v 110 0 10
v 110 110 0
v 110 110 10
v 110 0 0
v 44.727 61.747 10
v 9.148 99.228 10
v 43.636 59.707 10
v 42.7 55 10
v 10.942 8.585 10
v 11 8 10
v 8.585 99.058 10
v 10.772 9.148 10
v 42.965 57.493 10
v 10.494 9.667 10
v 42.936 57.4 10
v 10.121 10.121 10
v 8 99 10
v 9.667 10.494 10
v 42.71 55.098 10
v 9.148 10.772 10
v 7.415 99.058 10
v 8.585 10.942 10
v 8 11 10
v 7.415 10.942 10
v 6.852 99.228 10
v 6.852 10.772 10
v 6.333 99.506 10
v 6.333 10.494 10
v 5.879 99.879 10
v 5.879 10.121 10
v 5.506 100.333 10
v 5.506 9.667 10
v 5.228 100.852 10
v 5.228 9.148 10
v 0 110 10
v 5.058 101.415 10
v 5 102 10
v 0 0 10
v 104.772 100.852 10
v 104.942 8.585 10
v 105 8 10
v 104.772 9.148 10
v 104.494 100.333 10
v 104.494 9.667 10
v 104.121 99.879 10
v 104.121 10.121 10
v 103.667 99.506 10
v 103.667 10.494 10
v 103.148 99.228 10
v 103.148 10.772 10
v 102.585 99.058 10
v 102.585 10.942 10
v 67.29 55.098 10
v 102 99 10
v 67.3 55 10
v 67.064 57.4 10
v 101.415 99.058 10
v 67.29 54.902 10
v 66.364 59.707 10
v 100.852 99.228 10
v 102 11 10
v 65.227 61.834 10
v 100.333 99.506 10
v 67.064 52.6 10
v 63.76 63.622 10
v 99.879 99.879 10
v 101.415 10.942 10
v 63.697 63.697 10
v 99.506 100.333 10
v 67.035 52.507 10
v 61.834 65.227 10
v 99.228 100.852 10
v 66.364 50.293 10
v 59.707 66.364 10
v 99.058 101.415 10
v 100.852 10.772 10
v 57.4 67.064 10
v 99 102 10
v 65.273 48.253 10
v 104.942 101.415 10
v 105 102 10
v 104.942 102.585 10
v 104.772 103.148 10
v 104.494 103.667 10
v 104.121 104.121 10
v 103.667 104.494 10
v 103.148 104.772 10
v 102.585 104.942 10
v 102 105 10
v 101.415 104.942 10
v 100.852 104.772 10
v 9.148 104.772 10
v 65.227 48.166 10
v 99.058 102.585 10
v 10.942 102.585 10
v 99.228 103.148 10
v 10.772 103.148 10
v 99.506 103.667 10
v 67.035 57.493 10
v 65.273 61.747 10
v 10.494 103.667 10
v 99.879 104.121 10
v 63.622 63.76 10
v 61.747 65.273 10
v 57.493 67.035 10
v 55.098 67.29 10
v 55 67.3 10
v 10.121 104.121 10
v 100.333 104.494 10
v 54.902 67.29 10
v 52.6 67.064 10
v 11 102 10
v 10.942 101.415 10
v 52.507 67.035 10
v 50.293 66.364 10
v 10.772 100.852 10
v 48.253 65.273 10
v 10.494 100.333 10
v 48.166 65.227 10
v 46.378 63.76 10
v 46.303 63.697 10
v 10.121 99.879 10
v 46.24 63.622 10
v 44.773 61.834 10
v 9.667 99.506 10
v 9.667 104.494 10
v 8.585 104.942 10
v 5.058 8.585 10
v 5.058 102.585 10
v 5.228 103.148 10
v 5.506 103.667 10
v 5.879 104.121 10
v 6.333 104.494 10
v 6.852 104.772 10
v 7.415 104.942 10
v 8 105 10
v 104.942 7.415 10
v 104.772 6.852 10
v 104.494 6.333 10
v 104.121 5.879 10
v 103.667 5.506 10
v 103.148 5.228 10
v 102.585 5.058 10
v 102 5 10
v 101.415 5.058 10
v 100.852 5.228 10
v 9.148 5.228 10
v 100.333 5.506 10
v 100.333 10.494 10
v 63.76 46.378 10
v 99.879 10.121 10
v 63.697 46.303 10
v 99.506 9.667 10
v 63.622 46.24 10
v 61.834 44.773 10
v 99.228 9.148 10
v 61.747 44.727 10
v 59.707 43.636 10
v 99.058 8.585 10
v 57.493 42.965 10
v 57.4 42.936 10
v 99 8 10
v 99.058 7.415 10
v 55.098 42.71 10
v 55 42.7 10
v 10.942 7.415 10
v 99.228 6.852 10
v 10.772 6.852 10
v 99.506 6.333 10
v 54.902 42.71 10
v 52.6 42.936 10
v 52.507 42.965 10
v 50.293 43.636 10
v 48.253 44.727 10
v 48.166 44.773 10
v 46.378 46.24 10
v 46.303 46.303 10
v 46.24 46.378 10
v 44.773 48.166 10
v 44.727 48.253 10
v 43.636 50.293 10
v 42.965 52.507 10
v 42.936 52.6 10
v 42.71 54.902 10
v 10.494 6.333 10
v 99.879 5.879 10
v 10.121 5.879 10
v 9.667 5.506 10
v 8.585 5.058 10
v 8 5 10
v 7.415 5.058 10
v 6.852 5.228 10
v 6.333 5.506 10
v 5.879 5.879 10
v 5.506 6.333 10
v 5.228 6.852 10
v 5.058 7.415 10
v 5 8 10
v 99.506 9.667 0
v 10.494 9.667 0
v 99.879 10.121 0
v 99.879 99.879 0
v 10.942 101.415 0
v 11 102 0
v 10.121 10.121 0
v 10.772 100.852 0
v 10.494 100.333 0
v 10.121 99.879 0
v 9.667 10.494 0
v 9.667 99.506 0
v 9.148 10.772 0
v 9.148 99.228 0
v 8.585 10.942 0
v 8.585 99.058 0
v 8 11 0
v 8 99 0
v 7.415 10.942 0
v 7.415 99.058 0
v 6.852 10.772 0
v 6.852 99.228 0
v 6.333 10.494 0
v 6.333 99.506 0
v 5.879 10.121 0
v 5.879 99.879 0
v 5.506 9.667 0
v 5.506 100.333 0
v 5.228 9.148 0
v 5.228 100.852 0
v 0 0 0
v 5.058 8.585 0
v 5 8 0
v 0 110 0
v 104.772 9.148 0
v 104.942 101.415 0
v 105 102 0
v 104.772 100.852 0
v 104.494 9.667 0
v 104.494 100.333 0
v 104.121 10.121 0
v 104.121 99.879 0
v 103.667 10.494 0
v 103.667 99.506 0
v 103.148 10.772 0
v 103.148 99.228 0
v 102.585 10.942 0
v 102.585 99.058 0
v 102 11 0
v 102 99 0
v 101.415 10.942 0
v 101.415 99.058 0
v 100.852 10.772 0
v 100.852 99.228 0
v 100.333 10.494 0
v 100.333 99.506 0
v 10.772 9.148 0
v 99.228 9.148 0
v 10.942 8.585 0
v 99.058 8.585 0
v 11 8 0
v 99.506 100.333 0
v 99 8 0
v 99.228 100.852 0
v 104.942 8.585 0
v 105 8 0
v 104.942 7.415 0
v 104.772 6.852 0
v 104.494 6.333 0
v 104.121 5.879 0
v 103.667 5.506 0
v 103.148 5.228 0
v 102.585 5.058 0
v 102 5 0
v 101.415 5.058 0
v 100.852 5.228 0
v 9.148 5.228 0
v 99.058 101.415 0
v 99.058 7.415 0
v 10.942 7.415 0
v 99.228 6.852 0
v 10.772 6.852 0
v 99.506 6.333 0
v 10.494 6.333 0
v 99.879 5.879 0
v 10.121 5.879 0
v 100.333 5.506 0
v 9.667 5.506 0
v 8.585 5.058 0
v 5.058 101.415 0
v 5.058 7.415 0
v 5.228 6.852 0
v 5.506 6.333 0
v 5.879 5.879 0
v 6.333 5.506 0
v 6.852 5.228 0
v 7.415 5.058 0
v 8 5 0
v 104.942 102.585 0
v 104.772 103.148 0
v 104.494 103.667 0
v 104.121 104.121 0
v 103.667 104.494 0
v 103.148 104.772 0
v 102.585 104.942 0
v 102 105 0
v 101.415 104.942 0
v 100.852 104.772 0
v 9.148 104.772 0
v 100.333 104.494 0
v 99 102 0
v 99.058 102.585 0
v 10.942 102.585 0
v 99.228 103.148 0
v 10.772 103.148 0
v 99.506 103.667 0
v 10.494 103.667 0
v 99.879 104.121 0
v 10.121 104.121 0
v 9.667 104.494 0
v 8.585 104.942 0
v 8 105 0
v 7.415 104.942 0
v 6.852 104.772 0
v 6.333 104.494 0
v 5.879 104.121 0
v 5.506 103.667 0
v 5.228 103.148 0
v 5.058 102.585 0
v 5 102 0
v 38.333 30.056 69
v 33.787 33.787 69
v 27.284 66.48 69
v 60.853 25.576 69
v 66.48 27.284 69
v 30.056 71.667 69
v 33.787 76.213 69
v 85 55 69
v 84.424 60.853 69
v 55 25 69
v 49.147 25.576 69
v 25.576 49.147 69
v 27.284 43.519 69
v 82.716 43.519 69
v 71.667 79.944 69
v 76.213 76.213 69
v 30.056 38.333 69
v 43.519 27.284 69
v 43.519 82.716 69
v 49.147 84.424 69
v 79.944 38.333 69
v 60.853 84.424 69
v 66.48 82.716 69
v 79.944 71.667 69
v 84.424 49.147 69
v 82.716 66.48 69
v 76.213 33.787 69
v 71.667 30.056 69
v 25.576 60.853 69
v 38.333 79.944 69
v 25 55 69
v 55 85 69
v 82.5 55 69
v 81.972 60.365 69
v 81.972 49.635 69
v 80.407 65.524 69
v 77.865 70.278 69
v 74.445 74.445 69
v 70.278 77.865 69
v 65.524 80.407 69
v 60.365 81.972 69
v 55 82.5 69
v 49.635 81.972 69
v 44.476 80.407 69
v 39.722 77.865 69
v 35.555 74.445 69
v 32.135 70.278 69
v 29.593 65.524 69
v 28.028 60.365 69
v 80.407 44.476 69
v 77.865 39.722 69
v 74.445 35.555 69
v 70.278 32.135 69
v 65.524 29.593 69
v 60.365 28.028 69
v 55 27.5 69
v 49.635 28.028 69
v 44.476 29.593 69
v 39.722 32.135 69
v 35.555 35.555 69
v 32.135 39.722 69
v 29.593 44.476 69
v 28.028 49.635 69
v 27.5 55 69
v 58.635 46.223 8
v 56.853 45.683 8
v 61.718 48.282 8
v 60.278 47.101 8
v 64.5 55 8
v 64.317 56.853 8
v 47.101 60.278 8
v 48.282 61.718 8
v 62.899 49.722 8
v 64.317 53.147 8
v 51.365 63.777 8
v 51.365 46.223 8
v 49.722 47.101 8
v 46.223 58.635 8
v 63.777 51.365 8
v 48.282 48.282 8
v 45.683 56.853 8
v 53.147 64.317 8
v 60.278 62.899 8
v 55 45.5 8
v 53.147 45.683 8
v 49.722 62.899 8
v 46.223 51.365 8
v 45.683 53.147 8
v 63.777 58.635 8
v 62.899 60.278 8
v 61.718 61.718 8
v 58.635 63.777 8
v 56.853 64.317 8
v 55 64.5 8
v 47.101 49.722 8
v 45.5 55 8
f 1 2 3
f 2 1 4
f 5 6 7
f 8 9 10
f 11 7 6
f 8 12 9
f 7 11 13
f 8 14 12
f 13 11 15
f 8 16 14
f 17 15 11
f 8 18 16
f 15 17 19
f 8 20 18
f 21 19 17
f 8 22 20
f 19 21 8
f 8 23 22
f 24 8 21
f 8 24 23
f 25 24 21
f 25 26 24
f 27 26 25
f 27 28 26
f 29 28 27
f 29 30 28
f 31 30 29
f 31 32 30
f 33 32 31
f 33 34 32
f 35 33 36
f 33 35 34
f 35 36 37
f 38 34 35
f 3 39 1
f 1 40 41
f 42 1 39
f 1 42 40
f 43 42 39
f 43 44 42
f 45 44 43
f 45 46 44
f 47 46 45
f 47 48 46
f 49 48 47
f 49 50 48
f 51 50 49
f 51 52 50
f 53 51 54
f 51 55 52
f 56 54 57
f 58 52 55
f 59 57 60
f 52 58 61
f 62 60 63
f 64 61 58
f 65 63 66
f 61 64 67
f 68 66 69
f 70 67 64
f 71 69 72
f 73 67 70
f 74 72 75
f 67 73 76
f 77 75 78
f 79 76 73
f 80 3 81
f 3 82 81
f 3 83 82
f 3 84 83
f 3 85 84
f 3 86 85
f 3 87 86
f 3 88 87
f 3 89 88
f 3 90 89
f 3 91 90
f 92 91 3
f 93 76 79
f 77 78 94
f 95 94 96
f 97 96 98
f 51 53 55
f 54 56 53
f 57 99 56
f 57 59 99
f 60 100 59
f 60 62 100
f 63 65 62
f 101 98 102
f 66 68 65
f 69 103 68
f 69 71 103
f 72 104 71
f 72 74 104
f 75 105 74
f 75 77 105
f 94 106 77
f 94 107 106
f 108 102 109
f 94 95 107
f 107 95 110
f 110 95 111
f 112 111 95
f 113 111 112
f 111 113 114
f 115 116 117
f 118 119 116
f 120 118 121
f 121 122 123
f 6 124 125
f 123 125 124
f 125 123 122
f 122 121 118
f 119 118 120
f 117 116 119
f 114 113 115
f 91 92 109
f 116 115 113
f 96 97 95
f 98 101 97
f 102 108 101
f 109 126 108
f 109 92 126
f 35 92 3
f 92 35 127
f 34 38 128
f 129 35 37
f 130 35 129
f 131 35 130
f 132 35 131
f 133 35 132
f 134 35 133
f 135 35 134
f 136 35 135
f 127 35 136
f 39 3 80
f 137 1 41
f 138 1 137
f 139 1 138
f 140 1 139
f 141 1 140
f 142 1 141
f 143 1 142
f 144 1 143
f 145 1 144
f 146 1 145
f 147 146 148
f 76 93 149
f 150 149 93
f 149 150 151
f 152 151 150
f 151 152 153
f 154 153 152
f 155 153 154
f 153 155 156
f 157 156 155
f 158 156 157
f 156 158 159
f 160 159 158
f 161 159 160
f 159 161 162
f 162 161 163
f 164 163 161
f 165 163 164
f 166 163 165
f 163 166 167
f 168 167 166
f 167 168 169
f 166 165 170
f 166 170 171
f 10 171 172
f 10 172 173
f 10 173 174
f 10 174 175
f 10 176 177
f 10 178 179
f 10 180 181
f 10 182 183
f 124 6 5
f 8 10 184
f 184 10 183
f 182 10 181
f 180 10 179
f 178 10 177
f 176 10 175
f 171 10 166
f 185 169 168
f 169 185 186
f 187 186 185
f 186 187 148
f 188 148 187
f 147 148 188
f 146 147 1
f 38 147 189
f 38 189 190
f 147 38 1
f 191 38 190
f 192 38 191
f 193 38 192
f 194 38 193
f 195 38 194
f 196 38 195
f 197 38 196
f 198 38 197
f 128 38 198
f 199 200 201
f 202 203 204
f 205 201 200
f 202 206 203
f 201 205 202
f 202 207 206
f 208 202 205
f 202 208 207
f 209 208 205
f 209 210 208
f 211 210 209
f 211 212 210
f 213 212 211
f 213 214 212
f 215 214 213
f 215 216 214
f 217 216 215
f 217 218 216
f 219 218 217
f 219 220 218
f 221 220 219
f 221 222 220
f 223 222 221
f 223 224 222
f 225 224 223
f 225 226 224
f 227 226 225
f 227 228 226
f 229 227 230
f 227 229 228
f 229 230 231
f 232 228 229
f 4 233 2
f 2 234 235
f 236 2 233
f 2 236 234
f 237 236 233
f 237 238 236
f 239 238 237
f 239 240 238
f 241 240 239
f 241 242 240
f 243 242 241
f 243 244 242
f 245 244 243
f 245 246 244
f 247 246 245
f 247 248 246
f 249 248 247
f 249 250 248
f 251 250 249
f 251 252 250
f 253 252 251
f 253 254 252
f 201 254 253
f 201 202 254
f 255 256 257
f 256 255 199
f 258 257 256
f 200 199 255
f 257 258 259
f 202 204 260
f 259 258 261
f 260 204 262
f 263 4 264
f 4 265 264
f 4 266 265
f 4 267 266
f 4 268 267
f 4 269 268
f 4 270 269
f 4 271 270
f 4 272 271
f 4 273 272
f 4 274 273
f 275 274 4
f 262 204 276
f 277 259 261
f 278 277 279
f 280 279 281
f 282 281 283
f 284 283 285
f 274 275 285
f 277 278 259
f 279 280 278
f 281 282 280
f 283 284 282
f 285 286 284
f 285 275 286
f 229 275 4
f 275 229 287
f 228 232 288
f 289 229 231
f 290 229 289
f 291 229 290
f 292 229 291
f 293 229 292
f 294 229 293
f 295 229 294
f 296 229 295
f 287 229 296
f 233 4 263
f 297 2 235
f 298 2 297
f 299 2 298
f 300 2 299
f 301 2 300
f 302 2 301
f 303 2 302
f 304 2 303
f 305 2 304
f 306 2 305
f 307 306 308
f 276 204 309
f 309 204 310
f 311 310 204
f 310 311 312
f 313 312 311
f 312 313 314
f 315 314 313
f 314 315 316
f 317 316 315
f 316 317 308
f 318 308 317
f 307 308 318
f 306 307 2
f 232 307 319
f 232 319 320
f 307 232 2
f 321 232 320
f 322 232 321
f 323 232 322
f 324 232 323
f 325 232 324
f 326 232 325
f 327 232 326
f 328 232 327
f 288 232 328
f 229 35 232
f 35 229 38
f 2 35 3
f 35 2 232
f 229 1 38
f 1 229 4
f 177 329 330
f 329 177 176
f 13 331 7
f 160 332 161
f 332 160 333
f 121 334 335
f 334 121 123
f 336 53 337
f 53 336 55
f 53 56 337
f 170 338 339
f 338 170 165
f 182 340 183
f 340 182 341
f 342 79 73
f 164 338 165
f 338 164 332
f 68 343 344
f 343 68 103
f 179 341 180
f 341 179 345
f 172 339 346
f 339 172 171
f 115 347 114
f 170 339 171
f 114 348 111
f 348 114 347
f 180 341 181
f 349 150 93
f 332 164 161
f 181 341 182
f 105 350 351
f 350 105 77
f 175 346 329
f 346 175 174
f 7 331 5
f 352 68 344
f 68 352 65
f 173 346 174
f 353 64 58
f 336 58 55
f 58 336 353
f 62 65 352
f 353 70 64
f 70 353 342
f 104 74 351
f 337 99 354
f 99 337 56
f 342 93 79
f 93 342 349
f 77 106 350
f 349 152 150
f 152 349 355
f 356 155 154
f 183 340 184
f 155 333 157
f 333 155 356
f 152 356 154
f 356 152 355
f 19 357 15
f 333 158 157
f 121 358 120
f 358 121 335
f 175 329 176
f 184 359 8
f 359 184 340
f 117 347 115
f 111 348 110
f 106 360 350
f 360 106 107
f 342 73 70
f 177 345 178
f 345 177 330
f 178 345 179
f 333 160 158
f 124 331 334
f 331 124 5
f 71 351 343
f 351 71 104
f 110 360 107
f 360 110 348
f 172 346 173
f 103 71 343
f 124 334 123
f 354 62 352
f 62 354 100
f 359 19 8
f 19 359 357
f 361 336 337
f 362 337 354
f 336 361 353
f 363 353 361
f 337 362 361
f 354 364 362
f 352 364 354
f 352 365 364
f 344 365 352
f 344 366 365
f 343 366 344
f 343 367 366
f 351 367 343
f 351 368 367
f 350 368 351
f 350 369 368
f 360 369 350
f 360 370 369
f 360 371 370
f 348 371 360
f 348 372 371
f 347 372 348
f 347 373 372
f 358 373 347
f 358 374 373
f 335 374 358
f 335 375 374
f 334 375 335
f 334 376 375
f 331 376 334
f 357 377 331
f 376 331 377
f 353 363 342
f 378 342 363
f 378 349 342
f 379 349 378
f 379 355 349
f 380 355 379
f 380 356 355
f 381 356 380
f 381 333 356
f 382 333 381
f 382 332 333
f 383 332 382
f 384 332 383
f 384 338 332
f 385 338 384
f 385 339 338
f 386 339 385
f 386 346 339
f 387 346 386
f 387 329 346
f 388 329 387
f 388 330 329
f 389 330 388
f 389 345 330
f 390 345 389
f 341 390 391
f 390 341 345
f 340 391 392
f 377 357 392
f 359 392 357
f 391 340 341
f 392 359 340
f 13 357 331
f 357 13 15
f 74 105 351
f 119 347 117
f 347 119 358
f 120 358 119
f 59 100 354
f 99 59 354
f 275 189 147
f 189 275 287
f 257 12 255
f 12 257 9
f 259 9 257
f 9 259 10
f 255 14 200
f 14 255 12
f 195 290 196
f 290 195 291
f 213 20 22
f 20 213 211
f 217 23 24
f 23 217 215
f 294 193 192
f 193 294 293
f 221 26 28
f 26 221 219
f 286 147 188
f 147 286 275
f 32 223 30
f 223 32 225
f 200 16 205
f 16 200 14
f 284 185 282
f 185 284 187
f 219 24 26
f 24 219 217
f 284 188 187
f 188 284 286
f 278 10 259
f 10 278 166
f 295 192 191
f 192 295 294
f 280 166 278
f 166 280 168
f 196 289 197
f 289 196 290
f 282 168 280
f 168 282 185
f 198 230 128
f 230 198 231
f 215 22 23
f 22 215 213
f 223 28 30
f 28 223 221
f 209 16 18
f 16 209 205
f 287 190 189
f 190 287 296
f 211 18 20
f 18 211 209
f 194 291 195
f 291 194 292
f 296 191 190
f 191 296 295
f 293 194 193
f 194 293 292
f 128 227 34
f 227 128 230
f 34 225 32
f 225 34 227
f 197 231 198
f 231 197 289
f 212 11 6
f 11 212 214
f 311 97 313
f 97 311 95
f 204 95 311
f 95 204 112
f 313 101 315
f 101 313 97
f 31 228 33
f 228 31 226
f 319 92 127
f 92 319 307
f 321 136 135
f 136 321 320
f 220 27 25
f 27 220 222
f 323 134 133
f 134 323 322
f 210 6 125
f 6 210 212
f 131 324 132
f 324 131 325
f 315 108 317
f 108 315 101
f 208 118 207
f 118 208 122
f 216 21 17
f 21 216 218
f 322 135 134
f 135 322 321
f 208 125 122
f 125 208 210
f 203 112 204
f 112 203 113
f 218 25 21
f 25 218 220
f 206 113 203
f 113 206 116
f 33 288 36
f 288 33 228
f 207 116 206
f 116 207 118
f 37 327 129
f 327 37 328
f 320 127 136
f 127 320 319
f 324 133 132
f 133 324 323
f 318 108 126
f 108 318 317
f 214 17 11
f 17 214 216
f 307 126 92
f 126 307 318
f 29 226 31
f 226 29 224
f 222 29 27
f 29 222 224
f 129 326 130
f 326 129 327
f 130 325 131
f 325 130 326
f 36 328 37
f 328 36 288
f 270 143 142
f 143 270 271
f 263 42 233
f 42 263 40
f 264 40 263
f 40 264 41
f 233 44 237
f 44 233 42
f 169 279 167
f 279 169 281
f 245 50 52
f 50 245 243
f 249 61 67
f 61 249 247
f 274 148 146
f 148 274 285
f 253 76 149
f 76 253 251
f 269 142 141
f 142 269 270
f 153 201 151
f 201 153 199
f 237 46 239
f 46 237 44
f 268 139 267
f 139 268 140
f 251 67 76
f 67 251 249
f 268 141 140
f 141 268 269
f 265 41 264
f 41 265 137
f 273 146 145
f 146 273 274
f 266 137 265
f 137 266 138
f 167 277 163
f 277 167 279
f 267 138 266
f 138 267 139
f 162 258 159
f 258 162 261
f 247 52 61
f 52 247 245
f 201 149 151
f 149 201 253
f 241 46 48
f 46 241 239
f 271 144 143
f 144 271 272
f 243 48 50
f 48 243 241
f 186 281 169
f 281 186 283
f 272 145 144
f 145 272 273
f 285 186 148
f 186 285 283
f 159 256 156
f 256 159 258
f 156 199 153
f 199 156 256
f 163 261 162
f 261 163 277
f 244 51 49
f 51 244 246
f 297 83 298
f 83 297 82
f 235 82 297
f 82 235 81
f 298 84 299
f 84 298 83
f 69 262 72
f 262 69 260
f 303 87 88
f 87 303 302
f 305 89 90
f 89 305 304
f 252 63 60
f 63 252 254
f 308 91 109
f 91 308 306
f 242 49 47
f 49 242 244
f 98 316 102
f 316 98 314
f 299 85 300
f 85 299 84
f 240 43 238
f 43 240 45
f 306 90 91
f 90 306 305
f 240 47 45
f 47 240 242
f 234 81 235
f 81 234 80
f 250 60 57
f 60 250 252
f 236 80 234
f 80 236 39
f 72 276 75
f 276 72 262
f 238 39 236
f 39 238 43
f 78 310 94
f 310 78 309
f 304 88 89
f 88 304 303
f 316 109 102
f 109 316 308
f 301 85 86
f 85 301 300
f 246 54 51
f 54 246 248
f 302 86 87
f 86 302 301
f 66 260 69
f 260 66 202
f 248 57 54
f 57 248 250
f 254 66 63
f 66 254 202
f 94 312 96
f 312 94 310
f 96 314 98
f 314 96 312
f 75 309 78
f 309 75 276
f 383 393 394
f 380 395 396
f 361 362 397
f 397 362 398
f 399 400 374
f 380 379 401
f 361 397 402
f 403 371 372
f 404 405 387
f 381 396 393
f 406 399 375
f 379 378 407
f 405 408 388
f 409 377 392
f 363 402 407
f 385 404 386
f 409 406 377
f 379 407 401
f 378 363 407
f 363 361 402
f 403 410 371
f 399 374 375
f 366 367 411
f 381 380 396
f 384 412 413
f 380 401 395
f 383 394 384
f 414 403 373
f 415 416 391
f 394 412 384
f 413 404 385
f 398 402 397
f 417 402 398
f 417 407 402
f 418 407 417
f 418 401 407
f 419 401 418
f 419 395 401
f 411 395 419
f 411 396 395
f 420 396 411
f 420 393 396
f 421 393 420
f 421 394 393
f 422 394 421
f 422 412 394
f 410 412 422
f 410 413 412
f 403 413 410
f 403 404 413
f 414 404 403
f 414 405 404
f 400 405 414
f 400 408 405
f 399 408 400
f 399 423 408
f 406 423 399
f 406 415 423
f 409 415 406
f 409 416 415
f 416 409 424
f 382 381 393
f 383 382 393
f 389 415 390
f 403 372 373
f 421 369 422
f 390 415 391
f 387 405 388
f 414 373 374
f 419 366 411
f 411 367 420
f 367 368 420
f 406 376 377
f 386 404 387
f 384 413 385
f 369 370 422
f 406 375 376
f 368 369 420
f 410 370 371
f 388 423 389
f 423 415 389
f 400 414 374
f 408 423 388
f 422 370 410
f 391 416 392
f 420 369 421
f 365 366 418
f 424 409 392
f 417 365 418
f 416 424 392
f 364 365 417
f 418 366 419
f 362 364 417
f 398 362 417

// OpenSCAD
$fn = 32;

// ----------------------------------------------------------------------
// Hopper: flanged with square flange
// ----------------------------------------------------------------------

// --- parameters (mm) ---
fl = 110;                 // flange side, X and Y
fl_t = 10;                // flange thickness
cone_h = 60;              // cone height above the flange
top_d = 60;               // cone mouth diameter
bot_d = 24;               // cone spout diameter
wall = 2.5;               // cone wall thickness
hole_r = 3;               // flange hole radius
hole_in = 8;              // hole inset from the corners
fit_tol = 0.02;           // tolerance for press fits, mm
free_tol = 0.2;           // tolerance for clearance fits, mm

bore_d = bot_d - 2 * wall;  // spout bore diameter
total_h = fl_t + cone_h - 1;  // overall height

difference() {
  union() {
    cube([fl, fl, fl_t]);
    translate([fl / 2, fl / 2, fl_t - 1])
      cylinder(h = cone_h, d1 = bot_d, d2 = top_d);
  }
  translate([fl / 2, fl / 2, fl_t - 2])
    cylinder(h = cone_h + 1, d1 = bore_d, d2 = top_d - 2 * wall);
  for (sx = [0, 1], sy = [0, 1])
    translate([sx ? fl - hole_in : hole_in,
               sy ? fl - hole_in : hole_in, -1])
      cylinder(r = hole_r, h = fl_t + 2);
}
